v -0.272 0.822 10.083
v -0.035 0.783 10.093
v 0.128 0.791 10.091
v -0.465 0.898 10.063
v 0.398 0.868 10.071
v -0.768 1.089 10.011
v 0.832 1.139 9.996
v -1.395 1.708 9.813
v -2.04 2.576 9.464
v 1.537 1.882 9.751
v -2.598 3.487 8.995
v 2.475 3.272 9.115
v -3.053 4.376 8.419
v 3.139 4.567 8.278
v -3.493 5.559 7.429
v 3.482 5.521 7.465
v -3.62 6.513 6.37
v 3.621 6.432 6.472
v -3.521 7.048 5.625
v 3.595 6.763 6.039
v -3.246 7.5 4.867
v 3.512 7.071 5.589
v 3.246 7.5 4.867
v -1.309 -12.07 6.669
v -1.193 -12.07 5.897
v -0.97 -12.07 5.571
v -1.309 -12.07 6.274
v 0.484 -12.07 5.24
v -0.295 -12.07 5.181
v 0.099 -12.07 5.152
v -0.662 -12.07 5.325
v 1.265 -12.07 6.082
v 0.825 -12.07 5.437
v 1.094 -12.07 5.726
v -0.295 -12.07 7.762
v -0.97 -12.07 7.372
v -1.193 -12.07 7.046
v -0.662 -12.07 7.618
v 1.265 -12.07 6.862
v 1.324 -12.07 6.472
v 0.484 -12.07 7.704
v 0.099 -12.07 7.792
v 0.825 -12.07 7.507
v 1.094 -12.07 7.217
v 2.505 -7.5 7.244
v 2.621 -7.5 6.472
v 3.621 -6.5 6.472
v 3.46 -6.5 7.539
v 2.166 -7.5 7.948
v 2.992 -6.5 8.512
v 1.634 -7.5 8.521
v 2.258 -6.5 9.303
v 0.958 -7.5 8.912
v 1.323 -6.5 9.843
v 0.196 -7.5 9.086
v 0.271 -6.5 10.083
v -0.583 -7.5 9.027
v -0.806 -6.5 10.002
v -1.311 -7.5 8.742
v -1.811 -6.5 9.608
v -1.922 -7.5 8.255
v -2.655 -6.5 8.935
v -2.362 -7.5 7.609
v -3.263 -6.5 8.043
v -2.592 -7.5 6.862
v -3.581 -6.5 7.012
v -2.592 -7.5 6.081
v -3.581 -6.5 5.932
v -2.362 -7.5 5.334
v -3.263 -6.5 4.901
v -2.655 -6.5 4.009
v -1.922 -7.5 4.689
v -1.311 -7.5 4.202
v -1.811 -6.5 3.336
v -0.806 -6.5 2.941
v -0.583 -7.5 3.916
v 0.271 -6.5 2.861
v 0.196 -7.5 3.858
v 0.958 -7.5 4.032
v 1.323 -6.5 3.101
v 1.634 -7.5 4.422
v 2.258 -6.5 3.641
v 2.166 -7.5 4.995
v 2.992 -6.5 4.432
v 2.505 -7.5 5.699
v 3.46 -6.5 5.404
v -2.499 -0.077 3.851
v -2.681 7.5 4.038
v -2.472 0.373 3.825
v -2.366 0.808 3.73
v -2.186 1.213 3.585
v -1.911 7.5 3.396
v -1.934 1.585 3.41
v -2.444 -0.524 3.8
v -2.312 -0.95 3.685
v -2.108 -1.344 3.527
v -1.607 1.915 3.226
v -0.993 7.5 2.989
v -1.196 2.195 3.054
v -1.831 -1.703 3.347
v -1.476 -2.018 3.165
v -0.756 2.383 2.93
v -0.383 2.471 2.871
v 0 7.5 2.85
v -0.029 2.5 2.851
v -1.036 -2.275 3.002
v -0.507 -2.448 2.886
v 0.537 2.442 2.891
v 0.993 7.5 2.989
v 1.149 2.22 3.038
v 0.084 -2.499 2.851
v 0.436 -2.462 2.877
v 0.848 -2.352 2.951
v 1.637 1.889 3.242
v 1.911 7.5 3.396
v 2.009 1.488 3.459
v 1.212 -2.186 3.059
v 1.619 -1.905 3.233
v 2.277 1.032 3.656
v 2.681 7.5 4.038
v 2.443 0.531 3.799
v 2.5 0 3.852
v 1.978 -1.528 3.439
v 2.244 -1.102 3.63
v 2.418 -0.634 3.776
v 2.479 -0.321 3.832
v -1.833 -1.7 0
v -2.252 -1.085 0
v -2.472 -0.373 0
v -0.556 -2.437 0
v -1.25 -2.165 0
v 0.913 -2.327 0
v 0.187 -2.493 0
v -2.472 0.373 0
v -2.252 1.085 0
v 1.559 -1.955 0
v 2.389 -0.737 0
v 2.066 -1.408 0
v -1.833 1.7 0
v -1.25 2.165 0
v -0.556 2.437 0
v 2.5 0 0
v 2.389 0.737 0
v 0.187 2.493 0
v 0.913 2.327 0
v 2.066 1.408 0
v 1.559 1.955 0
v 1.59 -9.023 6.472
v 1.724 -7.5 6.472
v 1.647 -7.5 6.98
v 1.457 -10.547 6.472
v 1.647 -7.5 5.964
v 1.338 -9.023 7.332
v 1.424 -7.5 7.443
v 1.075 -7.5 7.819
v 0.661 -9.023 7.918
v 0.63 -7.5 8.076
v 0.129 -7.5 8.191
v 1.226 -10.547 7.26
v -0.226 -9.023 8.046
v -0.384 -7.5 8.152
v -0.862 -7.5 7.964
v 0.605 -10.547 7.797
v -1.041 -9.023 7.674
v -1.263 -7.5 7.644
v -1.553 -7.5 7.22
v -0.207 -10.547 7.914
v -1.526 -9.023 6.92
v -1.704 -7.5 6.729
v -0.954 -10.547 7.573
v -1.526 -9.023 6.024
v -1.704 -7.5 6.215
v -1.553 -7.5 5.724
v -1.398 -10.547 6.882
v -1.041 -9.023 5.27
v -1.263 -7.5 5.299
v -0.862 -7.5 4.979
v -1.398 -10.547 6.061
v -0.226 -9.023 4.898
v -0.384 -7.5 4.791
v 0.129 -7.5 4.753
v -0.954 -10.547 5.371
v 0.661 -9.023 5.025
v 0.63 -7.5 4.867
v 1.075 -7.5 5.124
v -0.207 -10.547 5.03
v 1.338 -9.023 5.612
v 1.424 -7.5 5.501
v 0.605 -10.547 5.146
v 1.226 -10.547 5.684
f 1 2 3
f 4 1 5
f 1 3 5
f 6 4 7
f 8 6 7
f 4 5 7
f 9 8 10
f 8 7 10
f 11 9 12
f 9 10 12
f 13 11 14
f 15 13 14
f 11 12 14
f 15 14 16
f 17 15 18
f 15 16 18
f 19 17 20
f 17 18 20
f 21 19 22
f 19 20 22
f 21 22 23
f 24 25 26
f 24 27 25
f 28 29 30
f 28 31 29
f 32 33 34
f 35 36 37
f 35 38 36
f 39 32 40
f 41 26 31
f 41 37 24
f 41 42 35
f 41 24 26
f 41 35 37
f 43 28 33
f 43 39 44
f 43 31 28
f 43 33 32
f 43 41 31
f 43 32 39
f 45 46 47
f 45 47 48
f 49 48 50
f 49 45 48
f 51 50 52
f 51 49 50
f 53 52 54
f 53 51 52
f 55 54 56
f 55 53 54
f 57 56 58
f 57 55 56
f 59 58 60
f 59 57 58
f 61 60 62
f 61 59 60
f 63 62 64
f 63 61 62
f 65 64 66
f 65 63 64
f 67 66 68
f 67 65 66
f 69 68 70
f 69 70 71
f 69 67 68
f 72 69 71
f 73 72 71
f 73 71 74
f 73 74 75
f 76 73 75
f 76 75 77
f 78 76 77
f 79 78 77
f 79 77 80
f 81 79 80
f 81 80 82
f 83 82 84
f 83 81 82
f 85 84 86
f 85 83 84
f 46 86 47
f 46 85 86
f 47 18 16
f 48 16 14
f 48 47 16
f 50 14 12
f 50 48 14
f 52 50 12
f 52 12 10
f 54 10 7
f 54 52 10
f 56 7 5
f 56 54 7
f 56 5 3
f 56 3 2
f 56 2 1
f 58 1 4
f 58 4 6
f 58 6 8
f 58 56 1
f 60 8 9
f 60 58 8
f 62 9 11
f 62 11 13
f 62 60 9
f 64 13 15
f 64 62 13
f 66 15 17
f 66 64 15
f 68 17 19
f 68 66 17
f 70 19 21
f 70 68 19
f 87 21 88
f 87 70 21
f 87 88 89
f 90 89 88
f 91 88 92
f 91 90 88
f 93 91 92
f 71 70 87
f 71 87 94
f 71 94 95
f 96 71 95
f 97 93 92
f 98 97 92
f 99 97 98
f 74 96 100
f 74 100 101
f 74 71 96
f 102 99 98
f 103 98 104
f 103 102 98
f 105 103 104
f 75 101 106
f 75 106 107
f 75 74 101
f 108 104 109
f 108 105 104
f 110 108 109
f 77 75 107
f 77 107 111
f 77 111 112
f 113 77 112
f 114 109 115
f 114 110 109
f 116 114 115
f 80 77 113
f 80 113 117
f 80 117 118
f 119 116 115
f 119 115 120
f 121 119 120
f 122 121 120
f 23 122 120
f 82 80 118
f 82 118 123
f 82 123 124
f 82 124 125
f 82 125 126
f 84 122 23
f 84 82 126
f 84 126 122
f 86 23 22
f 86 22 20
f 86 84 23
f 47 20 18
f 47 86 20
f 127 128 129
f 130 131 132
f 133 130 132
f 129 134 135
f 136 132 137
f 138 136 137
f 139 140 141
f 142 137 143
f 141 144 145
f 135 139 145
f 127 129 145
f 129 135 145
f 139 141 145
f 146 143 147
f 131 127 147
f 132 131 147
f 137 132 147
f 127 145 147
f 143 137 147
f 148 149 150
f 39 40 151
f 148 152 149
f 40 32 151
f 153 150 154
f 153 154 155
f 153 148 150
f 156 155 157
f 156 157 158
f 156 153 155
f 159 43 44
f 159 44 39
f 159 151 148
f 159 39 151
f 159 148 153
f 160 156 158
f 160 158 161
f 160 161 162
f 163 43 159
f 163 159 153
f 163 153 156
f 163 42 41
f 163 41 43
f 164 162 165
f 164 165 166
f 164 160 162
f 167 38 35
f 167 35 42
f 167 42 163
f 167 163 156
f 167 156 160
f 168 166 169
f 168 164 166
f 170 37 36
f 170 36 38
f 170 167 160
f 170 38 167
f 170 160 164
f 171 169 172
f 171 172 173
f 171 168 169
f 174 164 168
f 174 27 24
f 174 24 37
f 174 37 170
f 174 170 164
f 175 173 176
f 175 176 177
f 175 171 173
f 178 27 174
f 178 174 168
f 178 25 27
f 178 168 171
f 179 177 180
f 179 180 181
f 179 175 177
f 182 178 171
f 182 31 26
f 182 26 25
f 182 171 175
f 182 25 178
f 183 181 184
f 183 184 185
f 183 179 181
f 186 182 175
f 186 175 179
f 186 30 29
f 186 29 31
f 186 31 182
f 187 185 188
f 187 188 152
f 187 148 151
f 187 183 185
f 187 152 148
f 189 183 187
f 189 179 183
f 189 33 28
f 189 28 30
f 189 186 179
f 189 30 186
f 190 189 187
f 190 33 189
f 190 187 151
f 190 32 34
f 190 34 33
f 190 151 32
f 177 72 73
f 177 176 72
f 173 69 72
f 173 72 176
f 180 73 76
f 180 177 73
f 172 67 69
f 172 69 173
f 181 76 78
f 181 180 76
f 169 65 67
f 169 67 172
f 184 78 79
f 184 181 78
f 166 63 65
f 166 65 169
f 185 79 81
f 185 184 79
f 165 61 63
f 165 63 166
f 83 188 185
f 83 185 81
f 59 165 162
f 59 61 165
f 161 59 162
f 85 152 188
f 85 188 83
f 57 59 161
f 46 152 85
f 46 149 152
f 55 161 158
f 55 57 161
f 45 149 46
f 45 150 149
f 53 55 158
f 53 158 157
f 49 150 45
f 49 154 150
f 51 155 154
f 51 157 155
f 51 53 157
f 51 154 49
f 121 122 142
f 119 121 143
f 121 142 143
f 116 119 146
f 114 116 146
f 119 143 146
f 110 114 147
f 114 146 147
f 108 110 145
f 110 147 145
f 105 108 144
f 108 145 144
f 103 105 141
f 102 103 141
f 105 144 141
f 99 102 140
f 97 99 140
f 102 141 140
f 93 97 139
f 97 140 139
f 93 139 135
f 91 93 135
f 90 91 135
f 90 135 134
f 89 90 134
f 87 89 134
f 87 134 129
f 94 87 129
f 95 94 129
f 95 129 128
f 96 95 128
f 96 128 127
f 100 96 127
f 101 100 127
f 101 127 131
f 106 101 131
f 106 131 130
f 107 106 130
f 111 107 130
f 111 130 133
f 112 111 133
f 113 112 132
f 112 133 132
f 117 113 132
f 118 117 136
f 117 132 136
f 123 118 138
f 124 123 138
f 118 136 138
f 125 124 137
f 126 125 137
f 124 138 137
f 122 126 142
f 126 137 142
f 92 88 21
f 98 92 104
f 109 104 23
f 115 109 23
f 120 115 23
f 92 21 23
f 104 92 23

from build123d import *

# Parameters (mm, degrees)
F0_R     = 2.5
F1_DEPTH = 7
F2_R     = 3.6213085246
F3_DEPTH = 7.5
F5_DEPTH = 12.5
F6_SIZE  = 1
F7_R     = 1.7235477432
F8_DEPTH = 4.57
F8_TAPER = 5


with BuildPart() as f1:
    # F0 (on Top) → F1 (new body)
    with BuildSketch(Plane.XY):
        Circle(F0_R)
    extrude(amount=F1_DEPTH)

    # F2 (on Front) → F3 (join, symmetric)
    with BuildSketch(Plane.XZ):
        with Locations((0, 6.4717903733)):
            Circle(F2_R)
    extrude(amount=F3_DEPTH, both=True)

    # F4 (on Right) → F5 (cut, symmetric)
    with BuildSketch(Plane.YZ):
        with BuildLine():
            ThreePointArc((0, 10.2597363293), (4.7557858598, 8.1323980884), (7.9216584563, 3.9947275072))
            Line((7.9216584563, 3.9947275072), (7.9610617831, 10.2597363293))
            Line((7.9610617831, 10.2597363293), (0, 10.2597363293))
        make_face()
    extrude(amount=F5_DEPTH, both=True, mode=Mode.SUBTRACT)

    # F6
    f6_edges = [f1.edges().sort_by_distance(p)[0] for p in [
        (-3.621309, -7.5, 6.47179),
    ]]
    chamfer(f6_edges, length=F6_SIZE)

    # F7 (on face) → F8 (join)
    with BuildSketch(Plane.XZ.offset(7.5)):
        with Locations((0, 6.4717903733)):
            Circle(F7_R)
    extrude(amount=F8_DEPTH, taper=F8_TAPER)


solid = f1.part
